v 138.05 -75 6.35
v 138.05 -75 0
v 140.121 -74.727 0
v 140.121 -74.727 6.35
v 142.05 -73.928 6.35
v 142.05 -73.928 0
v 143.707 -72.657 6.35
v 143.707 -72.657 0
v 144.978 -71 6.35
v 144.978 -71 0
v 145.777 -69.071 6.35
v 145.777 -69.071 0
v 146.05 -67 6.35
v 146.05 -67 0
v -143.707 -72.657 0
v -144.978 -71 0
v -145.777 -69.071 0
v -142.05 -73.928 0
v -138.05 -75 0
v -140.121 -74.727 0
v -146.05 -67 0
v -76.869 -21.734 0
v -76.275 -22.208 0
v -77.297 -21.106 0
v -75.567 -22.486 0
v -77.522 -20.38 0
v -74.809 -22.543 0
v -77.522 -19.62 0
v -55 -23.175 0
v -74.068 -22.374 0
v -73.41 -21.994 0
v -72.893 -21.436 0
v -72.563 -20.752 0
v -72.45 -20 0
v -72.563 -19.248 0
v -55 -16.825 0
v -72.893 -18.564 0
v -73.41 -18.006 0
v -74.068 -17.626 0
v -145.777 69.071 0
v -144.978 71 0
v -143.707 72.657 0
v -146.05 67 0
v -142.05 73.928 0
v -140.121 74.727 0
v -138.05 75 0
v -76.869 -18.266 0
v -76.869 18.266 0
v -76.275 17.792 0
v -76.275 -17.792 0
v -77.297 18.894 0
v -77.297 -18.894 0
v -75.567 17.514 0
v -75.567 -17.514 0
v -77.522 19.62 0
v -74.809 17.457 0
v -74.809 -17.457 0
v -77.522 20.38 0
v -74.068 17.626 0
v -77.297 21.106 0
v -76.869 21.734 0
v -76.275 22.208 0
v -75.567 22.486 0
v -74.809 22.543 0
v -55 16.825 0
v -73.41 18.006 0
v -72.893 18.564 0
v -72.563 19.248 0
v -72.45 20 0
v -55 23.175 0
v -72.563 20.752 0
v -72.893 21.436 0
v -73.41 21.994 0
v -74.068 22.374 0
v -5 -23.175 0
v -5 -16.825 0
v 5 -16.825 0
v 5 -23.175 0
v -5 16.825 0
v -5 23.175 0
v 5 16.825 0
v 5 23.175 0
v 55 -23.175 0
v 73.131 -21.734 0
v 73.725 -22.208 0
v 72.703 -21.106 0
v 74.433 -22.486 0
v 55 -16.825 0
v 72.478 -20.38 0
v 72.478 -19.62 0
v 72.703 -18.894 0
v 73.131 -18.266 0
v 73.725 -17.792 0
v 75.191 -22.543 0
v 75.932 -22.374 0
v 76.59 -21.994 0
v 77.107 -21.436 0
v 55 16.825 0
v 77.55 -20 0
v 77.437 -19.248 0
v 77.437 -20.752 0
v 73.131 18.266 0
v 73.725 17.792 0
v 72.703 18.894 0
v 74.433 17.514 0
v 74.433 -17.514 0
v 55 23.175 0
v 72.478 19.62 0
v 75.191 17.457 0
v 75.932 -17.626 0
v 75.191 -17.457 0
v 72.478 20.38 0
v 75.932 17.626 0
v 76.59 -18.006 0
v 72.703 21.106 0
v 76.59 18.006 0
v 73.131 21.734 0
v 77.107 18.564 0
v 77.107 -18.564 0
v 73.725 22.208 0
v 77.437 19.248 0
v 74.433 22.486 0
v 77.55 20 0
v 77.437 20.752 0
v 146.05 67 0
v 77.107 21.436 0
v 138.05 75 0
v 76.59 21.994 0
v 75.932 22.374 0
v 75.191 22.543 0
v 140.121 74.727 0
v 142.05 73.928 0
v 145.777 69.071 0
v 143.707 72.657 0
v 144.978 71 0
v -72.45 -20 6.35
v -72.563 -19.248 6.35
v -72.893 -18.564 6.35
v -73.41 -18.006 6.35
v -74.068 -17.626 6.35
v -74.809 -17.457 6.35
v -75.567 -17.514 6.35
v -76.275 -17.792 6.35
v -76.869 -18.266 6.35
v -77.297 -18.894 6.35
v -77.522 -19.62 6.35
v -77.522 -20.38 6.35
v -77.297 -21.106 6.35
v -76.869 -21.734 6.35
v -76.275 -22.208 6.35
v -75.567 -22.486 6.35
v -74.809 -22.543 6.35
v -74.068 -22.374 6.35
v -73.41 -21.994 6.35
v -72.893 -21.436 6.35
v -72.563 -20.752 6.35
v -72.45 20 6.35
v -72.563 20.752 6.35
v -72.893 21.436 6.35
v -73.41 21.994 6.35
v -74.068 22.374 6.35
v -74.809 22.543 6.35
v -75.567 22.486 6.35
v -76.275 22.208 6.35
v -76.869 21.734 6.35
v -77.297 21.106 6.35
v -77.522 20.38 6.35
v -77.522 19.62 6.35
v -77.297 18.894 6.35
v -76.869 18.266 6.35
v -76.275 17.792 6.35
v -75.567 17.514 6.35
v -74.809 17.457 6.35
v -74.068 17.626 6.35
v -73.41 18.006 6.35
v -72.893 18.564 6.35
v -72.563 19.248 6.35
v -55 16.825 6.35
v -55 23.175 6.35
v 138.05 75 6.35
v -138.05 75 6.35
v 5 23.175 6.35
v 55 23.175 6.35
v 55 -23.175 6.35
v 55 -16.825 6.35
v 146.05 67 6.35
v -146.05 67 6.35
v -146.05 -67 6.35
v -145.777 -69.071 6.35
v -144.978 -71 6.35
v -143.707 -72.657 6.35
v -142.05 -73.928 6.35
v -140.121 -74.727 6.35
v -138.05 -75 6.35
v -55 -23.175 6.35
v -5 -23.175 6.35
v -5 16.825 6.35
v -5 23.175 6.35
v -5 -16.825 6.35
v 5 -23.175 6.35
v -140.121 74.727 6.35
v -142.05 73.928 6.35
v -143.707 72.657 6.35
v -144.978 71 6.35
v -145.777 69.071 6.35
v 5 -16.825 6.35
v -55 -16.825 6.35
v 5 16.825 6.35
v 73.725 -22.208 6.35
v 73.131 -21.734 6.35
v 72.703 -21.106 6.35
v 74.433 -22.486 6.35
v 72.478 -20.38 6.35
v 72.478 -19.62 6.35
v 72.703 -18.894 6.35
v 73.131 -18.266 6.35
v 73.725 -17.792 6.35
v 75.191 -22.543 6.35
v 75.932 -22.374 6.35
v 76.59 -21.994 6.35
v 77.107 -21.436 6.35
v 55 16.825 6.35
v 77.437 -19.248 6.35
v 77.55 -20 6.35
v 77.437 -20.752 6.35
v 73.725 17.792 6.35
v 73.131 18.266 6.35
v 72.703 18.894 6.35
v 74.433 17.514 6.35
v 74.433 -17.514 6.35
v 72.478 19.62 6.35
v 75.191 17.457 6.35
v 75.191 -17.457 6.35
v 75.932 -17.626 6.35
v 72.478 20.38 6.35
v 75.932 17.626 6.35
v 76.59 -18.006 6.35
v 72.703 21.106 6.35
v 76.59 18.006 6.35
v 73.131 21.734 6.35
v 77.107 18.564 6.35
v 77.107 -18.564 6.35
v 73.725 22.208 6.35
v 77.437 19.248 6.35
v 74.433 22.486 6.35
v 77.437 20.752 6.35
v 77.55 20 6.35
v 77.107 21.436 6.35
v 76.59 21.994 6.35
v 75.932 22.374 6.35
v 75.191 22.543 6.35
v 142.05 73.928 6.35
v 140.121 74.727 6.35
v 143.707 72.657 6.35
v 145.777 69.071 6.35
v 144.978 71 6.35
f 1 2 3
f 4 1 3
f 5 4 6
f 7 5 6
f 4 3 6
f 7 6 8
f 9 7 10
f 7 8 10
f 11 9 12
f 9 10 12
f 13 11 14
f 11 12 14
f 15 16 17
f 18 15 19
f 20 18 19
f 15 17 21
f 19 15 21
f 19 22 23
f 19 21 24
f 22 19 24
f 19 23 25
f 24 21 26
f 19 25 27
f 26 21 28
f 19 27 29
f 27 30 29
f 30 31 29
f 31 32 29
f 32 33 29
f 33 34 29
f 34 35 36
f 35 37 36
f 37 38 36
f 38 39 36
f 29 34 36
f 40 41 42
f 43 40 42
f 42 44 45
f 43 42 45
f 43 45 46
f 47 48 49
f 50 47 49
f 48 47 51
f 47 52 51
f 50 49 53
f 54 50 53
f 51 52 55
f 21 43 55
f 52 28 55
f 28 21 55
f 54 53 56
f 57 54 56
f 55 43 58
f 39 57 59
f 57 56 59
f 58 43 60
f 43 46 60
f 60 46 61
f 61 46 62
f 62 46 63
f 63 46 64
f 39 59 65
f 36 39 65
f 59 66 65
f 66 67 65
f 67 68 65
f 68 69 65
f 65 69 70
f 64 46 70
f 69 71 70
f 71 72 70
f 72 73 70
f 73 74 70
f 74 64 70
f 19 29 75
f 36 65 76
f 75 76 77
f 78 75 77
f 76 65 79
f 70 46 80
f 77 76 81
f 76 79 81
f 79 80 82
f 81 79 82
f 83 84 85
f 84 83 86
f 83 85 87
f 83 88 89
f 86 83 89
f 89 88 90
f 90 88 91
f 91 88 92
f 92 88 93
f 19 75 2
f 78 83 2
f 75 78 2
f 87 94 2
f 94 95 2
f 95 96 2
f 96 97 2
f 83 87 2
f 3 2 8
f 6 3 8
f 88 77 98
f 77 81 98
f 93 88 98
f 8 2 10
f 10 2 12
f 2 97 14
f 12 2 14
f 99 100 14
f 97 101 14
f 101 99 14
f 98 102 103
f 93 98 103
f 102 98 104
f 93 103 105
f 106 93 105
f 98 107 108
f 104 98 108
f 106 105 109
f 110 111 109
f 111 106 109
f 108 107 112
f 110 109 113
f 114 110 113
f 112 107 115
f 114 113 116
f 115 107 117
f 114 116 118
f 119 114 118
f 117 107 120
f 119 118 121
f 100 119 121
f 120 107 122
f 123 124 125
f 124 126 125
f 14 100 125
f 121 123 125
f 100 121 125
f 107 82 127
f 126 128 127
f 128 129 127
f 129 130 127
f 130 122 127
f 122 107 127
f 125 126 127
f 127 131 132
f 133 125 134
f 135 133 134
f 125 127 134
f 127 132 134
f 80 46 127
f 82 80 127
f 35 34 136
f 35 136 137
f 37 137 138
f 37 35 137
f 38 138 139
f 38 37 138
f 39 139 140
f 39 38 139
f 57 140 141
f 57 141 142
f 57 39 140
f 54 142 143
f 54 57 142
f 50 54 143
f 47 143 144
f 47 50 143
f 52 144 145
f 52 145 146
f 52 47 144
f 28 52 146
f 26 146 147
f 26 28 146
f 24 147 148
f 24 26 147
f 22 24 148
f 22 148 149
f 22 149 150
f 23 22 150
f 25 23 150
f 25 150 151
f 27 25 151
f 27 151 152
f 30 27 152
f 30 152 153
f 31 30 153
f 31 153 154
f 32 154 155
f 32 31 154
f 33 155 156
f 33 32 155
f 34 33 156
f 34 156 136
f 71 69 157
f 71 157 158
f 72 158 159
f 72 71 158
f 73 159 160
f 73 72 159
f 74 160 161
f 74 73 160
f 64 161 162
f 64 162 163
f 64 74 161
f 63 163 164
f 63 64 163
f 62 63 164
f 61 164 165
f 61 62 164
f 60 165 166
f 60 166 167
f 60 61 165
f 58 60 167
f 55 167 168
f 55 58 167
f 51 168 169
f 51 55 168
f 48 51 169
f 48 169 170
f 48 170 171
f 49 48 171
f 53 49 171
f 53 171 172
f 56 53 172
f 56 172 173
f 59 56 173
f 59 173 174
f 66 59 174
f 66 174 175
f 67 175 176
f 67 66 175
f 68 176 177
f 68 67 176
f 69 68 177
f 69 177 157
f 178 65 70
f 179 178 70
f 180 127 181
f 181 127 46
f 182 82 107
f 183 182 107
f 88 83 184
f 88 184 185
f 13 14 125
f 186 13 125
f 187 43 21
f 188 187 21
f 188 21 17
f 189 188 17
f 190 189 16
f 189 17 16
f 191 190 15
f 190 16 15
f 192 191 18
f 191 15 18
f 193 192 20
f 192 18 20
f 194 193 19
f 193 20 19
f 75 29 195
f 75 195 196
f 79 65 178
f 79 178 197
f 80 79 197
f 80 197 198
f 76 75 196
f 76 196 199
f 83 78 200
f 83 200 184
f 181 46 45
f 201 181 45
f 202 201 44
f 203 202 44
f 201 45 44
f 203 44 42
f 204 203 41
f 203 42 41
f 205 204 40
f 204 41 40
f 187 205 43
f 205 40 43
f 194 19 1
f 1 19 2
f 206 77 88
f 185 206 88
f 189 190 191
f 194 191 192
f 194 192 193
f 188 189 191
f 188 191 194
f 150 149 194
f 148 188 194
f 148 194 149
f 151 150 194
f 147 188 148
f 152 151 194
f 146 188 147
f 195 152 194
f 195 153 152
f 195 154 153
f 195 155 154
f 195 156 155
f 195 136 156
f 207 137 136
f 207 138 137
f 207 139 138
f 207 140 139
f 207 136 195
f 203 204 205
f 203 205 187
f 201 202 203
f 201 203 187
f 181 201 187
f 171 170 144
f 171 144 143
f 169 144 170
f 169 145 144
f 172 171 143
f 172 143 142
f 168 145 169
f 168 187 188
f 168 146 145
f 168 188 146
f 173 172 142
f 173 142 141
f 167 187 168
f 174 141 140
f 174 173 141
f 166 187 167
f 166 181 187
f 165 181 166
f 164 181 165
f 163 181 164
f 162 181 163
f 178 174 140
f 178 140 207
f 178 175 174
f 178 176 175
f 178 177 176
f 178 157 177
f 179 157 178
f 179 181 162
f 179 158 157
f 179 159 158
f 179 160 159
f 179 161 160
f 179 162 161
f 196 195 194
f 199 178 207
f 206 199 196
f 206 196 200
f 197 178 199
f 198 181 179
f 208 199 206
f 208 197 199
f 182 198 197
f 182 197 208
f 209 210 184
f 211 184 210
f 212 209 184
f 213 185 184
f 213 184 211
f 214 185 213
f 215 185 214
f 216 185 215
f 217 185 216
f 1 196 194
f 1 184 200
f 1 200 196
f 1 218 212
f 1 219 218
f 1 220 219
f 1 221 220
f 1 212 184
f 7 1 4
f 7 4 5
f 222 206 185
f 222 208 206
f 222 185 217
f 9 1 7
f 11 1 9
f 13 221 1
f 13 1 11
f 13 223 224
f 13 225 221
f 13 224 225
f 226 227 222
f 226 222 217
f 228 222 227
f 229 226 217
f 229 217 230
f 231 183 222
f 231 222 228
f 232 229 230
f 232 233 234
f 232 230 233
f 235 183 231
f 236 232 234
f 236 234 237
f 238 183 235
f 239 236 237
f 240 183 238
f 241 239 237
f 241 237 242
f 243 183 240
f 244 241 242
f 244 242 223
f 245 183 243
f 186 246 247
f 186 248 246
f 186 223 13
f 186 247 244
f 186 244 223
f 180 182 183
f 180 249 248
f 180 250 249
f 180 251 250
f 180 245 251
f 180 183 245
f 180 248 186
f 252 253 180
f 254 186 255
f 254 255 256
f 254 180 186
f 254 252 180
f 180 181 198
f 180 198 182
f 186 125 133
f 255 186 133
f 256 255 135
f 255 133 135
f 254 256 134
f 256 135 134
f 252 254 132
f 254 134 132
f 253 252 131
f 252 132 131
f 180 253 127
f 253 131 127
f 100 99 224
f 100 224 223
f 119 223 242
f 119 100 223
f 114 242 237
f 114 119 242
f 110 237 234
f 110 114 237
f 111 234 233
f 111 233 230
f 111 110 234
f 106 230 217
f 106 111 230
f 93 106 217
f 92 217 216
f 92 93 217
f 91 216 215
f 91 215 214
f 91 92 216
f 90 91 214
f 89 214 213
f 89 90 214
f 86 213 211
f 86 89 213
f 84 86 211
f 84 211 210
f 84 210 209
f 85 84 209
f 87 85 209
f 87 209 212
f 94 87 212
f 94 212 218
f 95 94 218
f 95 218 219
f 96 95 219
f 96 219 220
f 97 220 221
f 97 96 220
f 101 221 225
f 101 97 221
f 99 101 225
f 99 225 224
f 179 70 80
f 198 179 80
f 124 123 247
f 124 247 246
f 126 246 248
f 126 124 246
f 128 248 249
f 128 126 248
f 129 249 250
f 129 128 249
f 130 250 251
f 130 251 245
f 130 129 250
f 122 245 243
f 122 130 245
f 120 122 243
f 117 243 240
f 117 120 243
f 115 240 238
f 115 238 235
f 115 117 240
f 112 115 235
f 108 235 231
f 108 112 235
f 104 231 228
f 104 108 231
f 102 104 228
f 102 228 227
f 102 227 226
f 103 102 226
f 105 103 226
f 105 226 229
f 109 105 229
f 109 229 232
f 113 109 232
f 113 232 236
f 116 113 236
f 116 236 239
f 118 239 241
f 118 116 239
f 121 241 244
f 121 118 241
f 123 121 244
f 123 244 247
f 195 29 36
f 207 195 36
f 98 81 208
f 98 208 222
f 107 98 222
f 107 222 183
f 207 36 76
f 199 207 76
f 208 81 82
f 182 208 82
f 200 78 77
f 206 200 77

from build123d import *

# Parameters (mm, degrees)
F0_R     = 2.55
F0_W     = 50
F0_H     = 6.35
F1_DEPTH = 6.35


with BuildPart() as f1:
    # F0 (on Top) → F1 (new body)
    with BuildSketch(Plane.XY):
        with BuildLine():
            ThreePointArc((146.05, 67), (143.706854, 72.656854), (138.05, 75))
            Line((138.05, 75), (-138.05, 75))
            ThreePointArc((-138.05, 75), (-143.706854, 72.656854), (-146.05, 67))
            Line((-146.05, 67), (-146.05, -67))
            ThreePointArc((-146.05, -67), (-143.706854, -72.656854), (-138.05, -75))
            Line((-138.05, -75), (138.05, -75))
            ThreePointArc((138.05, -75), (143.706854, -72.656854), (146.05, -67))
            Line((146.05, -67), (146.05, 67))
        make_face()
        with Locations((-75, -20)):
            Circle(F0_R, mode=Mode.SUBTRACT)
        with Locations((-30, -20)):
            Rectangle(F0_W, F0_H, mode=Mode.SUBTRACT)
        with Locations((30, -20)):
            Rectangle(F0_W, F0_H, mode=Mode.SUBTRACT)
        with Locations((75, -20)):
            Circle(F0_R, mode=Mode.SUBTRACT)
        with Locations((-75, 20)):
            Circle(F0_R, mode=Mode.SUBTRACT)
        with Locations((-30, 20)):
            Rectangle(F0_W, F0_H, mode=Mode.SUBTRACT)
        with Locations((30, 20)):
            Rectangle(F0_W, F0_H, mode=Mode.SUBTRACT)
        with Locations((75, 20)):
            Circle(F0_R, mode=Mode.SUBTRACT)
    extrude(amount=F1_DEPTH)


solid = f1.part
